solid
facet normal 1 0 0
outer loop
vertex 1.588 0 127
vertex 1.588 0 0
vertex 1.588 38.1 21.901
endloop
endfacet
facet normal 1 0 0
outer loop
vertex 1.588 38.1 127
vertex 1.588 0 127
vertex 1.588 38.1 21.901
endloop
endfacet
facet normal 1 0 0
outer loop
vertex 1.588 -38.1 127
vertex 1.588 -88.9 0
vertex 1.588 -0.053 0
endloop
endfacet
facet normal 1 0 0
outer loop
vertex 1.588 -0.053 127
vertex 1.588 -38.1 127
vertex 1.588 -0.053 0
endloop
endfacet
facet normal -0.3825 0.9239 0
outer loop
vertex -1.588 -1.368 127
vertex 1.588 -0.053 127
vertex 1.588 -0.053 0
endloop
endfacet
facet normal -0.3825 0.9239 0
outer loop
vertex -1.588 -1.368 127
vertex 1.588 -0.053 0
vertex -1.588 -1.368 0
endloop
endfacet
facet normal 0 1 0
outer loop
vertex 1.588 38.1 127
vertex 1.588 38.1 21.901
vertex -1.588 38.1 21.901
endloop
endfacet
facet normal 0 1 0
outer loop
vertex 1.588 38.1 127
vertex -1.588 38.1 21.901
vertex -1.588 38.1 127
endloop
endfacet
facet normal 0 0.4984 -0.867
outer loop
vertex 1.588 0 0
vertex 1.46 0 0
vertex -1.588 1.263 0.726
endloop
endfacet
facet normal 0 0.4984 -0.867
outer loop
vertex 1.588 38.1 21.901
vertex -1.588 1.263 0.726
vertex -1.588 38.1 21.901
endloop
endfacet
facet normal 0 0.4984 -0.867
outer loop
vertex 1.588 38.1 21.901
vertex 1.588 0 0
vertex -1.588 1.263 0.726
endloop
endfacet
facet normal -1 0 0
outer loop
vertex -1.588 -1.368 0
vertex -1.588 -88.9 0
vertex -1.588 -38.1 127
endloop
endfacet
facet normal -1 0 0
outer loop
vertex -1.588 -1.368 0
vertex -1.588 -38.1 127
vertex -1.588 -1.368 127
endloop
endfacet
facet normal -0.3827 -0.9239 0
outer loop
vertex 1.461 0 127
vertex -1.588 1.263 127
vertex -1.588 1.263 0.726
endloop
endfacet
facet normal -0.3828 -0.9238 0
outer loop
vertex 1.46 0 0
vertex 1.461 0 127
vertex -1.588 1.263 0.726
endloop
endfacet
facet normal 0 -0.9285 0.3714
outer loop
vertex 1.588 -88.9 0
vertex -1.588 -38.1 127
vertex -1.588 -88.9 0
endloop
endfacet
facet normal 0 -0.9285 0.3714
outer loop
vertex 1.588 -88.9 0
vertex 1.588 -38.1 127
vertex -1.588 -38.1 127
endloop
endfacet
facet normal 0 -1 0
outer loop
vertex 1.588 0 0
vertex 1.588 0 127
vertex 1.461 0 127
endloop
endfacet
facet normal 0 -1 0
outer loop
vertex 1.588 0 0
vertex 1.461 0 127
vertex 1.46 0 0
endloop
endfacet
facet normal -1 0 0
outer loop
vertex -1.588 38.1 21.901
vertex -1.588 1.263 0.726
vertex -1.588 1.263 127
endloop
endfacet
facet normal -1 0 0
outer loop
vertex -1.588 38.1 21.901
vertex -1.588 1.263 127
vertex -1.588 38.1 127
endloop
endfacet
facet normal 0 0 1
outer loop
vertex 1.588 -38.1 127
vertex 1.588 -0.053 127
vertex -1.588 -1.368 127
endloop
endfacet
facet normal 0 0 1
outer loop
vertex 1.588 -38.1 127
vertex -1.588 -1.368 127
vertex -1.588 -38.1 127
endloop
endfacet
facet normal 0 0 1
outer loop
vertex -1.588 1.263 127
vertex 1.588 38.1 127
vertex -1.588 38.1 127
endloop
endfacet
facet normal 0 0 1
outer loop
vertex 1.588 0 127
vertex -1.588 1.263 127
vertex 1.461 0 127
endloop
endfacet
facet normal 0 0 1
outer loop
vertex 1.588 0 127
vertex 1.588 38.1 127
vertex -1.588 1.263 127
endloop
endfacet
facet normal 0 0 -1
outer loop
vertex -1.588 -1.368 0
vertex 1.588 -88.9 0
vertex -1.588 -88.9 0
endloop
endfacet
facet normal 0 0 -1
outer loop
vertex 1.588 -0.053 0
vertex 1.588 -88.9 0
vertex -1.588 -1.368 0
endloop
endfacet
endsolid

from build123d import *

# Parameters (mm, degrees)
F1_DEPTH    = 1.5875
F2_DEPTH    = 1.5875
F3_T1_DEPTH = 144.1219952748
F4_SIZE2    = 1.2625229381
F4_SIZE     = 3.048


# Not quite as in the source:
# - a fillet or chamfer that OpenCascade refuses, or shapes differently, is made with other operations: its cross-section is extruded or revolved along the edge and cut away or added


with BuildPart() as f1:
    # F0 (on Right) → F1 (new body, symmetric)
    with BuildSketch(Plane.YZ):
        Polygon((-88.9, 0), (0, 0), (0, 127), (-38.1, 127), align=None)
    extrude(amount=F1_DEPTH, both=True)

    # F3: chamfer of 3.302 x 1.367733183 on 1 edges, made by hand

    # F3_s2 → F3_t1 (cut)
    with BuildSketch(Plane.XY.offset(-8.5609976374)):
        Polygon((1.7145, 0), (-1.5875, -1.367733183), (-1.5875, 0), align=None)
    extrude(amount=F3_T1_DEPTH, mode=Mode.SUBTRACT)


with BuildPart() as f2:
    # F0 (on Right) → F2 (new body, symmetric)
    with BuildSketch(Plane.YZ):
        Polygon((0, 127), (0, 0), (38.1, 21.900890395), (38.1, 127), align=None)
    extrude(amount=F2_DEPTH, both=True)

    # F4
    f4_edges = [f2.edges().sort_by_distance(p)[0] for p in [
        (-1.5875, 0, 63.5),
    ]]
    f4_side = f2.faces().sort_by_distance((0, 0, 63.5))[0]
    chamfer(f4_edges, length=F4_SIZE, length2=F4_SIZE2, reference=f4_side)


solid = Compound([f1.part, f2.part])
